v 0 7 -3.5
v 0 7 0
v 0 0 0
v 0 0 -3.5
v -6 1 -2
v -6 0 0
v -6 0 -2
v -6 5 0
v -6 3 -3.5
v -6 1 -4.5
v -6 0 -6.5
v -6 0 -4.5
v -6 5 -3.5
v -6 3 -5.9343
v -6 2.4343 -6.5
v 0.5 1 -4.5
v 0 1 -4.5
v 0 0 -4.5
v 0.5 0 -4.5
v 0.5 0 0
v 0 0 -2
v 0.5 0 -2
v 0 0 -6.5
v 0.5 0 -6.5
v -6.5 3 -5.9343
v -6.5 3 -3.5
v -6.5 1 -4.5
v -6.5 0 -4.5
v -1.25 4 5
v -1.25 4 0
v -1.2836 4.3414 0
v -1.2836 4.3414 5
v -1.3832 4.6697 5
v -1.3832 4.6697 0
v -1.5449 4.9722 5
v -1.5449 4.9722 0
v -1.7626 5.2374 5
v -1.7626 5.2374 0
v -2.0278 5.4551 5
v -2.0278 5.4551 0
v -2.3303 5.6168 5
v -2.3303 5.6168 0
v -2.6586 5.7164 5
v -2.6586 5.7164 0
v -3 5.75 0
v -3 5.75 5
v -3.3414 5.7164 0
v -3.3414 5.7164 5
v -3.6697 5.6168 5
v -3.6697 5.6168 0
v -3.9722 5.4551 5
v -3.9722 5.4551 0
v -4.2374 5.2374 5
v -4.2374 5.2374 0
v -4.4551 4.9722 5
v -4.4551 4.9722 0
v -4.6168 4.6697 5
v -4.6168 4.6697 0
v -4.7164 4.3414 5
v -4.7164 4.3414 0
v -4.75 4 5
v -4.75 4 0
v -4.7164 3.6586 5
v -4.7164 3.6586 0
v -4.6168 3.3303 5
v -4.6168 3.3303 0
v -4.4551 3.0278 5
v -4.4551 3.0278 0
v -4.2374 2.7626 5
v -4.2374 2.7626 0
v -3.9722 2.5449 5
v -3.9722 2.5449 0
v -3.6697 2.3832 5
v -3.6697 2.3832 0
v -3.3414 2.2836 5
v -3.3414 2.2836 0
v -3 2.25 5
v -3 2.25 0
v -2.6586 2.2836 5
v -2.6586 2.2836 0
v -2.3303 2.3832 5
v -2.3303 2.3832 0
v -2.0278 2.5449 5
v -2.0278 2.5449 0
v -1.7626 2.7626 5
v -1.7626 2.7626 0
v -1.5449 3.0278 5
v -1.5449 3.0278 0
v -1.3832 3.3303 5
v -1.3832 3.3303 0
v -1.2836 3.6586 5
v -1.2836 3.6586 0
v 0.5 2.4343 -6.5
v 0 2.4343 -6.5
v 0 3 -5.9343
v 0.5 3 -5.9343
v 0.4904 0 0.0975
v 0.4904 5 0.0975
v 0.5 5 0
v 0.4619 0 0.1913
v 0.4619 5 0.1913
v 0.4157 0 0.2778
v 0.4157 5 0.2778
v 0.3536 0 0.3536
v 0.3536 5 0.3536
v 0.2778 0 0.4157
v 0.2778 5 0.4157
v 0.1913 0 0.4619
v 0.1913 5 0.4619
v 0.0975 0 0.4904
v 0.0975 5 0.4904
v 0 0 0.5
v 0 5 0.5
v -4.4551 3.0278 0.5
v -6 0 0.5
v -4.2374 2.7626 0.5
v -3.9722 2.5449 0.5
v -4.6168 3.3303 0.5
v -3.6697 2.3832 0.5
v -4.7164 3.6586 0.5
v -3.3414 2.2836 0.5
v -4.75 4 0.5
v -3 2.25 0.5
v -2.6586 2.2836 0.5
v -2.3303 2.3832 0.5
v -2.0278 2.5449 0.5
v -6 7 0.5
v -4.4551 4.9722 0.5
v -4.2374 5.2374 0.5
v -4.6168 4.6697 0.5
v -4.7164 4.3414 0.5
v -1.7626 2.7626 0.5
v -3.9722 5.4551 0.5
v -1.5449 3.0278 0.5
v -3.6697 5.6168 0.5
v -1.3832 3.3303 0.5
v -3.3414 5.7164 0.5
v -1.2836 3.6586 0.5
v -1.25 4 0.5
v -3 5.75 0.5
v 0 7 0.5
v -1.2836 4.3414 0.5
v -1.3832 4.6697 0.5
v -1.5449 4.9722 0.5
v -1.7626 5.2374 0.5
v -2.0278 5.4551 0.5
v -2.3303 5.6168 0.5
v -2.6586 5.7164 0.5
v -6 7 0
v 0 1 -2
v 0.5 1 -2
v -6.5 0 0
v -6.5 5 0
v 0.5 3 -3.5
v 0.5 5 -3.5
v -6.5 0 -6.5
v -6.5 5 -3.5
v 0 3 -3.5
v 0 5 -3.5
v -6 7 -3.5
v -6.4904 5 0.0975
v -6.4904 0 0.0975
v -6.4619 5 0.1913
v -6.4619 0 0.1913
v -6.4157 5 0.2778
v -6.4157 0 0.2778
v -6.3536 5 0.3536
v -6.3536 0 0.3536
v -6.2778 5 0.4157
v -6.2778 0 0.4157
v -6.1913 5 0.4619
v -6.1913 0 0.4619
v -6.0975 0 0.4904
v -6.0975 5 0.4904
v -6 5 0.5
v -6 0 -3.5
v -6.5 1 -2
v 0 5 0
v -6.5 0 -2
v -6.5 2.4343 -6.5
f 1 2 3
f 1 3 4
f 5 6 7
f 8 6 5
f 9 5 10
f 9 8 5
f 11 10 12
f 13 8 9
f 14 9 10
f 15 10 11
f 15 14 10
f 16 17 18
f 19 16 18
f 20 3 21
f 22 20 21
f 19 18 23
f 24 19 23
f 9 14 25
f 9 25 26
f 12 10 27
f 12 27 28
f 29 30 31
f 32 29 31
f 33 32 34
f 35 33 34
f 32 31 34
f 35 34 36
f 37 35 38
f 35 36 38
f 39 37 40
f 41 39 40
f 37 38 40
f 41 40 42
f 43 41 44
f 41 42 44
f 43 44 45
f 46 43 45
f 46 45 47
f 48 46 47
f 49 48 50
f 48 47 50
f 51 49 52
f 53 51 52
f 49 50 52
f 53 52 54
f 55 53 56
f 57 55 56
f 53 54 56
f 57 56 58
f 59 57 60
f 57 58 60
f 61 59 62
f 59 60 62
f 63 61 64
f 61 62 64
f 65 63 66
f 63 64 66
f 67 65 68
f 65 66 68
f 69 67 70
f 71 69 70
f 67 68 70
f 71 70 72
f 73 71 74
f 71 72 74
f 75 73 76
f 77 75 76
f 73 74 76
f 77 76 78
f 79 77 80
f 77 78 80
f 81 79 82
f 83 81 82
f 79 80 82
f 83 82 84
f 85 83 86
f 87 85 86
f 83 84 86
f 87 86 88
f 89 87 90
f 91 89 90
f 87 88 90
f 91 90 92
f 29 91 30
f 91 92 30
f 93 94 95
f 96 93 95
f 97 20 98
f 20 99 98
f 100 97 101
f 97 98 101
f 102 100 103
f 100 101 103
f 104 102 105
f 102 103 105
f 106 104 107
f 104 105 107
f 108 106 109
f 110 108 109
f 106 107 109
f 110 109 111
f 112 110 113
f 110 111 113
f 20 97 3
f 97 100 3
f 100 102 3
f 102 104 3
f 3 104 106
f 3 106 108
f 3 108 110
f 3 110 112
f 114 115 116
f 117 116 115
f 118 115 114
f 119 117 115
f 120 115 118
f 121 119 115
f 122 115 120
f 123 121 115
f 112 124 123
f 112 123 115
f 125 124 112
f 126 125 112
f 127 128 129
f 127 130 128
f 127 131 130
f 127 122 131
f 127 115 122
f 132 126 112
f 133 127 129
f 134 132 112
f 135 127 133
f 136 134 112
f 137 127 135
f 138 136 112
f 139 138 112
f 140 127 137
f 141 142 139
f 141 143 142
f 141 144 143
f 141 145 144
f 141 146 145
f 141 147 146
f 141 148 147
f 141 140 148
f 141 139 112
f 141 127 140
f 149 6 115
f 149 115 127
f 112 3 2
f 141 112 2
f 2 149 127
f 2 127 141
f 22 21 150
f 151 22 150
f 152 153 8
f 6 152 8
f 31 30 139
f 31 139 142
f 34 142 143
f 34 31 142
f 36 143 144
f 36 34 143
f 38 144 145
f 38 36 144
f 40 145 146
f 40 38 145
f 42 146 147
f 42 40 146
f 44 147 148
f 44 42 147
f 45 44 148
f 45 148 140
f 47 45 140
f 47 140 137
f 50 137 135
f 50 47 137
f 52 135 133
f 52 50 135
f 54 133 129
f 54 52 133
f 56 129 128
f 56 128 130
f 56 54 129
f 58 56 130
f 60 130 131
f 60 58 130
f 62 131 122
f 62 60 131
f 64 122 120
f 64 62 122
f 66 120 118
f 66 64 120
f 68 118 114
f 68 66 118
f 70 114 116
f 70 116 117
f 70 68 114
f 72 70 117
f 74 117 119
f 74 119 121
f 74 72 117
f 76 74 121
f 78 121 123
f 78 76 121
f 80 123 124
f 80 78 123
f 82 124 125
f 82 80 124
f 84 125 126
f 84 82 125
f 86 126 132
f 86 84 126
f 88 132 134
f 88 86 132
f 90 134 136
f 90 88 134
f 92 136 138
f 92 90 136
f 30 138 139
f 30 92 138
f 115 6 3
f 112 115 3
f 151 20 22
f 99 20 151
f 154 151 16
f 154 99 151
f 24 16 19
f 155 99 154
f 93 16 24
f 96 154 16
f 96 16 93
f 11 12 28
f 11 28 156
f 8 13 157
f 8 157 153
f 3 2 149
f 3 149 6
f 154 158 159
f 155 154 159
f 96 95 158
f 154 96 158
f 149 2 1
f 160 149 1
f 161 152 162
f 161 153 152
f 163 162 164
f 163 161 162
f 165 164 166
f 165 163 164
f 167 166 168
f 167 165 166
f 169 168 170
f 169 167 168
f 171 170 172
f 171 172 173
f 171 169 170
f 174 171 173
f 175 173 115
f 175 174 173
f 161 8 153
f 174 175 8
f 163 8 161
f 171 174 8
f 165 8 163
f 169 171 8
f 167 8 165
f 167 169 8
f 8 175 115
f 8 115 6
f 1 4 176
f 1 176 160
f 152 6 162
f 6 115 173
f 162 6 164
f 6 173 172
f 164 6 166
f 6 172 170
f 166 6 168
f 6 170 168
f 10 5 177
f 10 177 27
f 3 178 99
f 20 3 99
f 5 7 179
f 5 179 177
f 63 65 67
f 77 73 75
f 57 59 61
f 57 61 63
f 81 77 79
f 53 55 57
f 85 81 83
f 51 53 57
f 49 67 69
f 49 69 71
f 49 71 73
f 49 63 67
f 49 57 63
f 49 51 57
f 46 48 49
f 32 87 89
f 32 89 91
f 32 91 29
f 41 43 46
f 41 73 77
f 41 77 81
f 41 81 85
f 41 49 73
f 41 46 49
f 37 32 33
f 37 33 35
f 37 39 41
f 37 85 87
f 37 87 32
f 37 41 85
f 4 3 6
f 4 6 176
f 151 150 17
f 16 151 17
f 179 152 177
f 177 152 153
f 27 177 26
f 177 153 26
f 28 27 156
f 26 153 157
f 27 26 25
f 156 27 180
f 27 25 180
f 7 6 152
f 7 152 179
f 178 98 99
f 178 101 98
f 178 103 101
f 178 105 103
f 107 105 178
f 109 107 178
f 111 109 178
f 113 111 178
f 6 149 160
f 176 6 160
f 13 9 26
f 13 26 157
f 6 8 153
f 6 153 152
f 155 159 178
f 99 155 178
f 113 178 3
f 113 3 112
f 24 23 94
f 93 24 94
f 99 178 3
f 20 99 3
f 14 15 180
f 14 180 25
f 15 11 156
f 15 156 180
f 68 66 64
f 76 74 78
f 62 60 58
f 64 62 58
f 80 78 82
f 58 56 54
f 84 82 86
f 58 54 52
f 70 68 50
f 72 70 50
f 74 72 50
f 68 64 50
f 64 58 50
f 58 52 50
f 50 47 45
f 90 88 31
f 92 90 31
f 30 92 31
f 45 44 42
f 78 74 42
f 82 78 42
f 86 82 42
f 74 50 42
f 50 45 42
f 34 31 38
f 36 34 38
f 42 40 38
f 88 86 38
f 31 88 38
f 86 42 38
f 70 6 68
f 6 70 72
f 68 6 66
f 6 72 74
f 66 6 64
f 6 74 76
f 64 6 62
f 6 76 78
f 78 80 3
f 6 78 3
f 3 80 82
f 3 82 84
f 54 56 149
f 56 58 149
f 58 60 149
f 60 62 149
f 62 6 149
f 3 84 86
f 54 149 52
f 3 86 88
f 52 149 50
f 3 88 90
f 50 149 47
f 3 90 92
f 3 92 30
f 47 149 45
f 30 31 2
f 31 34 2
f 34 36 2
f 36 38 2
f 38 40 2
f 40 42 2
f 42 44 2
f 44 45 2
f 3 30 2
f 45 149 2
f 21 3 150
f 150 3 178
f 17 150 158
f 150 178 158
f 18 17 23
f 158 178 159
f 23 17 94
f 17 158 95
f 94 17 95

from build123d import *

# Parameters (mm, degrees)
EXTRUDE_1_DEPTH = 0.5
SKETCH_1_3_W    = 1.5
SKETCH_1_3_H    = 1
SKETCH_1_3_W_2  = 3.5
SKETCH_1_3_H_2  = 2
EXTRUDE_2_DEPTH = 6
EXTRUDE_START   = -6
EXTRUDE_3_DEPTH = 0.5
SKETCH_2_R      = 1.75
EXTRUDE_4_DEPTH = 5
SKETCH_3_W      = 6
SKETCH_3_H      = 7
SKETCH_3_R      = 1.75
EXTRUDE_5_DEPTH = 0.5
SKETCH_5_W      = 0.5
SKETCH_5_H      = 5
REVOLVE_1_ANGLE = 90
SKETCH_6_W      = 0.5
SKETCH_6_H      = 5
REVOLVE_2_ANGLE = 90


with BuildPart() as part:
    # Sketch 1 → Extrude 1 (new body)
    with BuildSketch(Plane(origin=(0, 0, 0), x_dir=(0, 0, -1), z_dir=(1, 0, 0))):
        Polygon((0, 5), (0, 0), (2, 0), (2, 1), (4.5, 1), (4.5, 0), (6.5, 0), (6.5, 2.434314575), (5.934314575, 3), (3.5, 3), (3.5, 5), align=None)
    extrude(amount=EXTRUDE_1_DEPTH)


with BuildPart() as body_2:
    # Sketch 1_3 → Extrude 2 (new body)
    with BuildSketch(Plane(origin=(0, 0, 0), x_dir=(0, 0, -1), z_dir=(1, 0, 0))):
        with Locations((2.75, 0.5)):
            Rectangle(SKETCH_1_3_W, SKETCH_1_3_H)
        Polygon((0, 5), (0, 0), (2, 0), (2, 1), (3.5, 1), (3.5, 3), (3.5, 5), align=None)
        with Locations((1.75, 6)):
            Rectangle(SKETCH_1_3_W_2, SKETCH_1_3_H_2)
    extrude(amount=-EXTRUDE_2_DEPTH)


with BuildPart() as body_3:
    # Sketch 1_4 → Extrude 3 (new body)
    with BuildSketch(Plane(origin=(0, 0, 0), x_dir=(0, 0, -1), z_dir=(1, 0, 0)).offset(EXTRUDE_START)):
        Polygon((5.934314575, 3), (3.5, 3), (3.5, 1), (4.5, 1), (4.5, 0), (6.5, 0), (6.5, 2.434314575), align=None)
        Polygon((0, 5), (0, 0), (2, 0), (2, 1), (3.5, 1), (3.5, 3), (3.5, 5), align=None)
    extrude(amount=-EXTRUDE_3_DEPTH)


with BuildPart() as body_4:
    # Sketch 2 → Extrude 4 (new body)
    with BuildSketch(Plane.XY):
        with Locations((-3, 4)):
            Circle(SKETCH_2_R)
    extrude(amount=EXTRUDE_4_DEPTH)


with BuildPart() as body_5:
    # Sketch 3 → Extrude 5 (new body)
    with BuildSketch(Plane.XY):
        with Locations((-3, 3.5)):
            Rectangle(SKETCH_3_W, SKETCH_3_H)
        with Locations((-3, 4)):
            Circle(SKETCH_3_R, mode=Mode.SUBTRACT)
    extrude(amount=EXTRUDE_5_DEPTH)


with BuildPart() as body_6:
    # Sketch 5 → Revolve 1 (revolve)
    with BuildSketch(Plane.XY):
        with Locations((-6.25, 2.5)):
            Rectangle(SKETCH_5_W, SKETCH_5_H)
    revolve(axis=Axis((-6, 0, 0), (0, 1, 0)), revolution_arc=REVOLVE_1_ANGLE)


with BuildPart() as body_7:
    # Sketch 6 → Revolve 2 (revolve)
    with BuildSketch(Plane.XY):
        with Locations((0.25, 2.5)):
            Rectangle(SKETCH_6_W, SKETCH_6_H)
    revolve(axis=Axis((0, 5, 0), (0, -1, 0)), revolution_arc=REVOLVE_2_ANGLE)


solid = Compound([part.part, body_2.part, body_3.part, body_4.part, body_5.part, body_6.part, body_7.part])
